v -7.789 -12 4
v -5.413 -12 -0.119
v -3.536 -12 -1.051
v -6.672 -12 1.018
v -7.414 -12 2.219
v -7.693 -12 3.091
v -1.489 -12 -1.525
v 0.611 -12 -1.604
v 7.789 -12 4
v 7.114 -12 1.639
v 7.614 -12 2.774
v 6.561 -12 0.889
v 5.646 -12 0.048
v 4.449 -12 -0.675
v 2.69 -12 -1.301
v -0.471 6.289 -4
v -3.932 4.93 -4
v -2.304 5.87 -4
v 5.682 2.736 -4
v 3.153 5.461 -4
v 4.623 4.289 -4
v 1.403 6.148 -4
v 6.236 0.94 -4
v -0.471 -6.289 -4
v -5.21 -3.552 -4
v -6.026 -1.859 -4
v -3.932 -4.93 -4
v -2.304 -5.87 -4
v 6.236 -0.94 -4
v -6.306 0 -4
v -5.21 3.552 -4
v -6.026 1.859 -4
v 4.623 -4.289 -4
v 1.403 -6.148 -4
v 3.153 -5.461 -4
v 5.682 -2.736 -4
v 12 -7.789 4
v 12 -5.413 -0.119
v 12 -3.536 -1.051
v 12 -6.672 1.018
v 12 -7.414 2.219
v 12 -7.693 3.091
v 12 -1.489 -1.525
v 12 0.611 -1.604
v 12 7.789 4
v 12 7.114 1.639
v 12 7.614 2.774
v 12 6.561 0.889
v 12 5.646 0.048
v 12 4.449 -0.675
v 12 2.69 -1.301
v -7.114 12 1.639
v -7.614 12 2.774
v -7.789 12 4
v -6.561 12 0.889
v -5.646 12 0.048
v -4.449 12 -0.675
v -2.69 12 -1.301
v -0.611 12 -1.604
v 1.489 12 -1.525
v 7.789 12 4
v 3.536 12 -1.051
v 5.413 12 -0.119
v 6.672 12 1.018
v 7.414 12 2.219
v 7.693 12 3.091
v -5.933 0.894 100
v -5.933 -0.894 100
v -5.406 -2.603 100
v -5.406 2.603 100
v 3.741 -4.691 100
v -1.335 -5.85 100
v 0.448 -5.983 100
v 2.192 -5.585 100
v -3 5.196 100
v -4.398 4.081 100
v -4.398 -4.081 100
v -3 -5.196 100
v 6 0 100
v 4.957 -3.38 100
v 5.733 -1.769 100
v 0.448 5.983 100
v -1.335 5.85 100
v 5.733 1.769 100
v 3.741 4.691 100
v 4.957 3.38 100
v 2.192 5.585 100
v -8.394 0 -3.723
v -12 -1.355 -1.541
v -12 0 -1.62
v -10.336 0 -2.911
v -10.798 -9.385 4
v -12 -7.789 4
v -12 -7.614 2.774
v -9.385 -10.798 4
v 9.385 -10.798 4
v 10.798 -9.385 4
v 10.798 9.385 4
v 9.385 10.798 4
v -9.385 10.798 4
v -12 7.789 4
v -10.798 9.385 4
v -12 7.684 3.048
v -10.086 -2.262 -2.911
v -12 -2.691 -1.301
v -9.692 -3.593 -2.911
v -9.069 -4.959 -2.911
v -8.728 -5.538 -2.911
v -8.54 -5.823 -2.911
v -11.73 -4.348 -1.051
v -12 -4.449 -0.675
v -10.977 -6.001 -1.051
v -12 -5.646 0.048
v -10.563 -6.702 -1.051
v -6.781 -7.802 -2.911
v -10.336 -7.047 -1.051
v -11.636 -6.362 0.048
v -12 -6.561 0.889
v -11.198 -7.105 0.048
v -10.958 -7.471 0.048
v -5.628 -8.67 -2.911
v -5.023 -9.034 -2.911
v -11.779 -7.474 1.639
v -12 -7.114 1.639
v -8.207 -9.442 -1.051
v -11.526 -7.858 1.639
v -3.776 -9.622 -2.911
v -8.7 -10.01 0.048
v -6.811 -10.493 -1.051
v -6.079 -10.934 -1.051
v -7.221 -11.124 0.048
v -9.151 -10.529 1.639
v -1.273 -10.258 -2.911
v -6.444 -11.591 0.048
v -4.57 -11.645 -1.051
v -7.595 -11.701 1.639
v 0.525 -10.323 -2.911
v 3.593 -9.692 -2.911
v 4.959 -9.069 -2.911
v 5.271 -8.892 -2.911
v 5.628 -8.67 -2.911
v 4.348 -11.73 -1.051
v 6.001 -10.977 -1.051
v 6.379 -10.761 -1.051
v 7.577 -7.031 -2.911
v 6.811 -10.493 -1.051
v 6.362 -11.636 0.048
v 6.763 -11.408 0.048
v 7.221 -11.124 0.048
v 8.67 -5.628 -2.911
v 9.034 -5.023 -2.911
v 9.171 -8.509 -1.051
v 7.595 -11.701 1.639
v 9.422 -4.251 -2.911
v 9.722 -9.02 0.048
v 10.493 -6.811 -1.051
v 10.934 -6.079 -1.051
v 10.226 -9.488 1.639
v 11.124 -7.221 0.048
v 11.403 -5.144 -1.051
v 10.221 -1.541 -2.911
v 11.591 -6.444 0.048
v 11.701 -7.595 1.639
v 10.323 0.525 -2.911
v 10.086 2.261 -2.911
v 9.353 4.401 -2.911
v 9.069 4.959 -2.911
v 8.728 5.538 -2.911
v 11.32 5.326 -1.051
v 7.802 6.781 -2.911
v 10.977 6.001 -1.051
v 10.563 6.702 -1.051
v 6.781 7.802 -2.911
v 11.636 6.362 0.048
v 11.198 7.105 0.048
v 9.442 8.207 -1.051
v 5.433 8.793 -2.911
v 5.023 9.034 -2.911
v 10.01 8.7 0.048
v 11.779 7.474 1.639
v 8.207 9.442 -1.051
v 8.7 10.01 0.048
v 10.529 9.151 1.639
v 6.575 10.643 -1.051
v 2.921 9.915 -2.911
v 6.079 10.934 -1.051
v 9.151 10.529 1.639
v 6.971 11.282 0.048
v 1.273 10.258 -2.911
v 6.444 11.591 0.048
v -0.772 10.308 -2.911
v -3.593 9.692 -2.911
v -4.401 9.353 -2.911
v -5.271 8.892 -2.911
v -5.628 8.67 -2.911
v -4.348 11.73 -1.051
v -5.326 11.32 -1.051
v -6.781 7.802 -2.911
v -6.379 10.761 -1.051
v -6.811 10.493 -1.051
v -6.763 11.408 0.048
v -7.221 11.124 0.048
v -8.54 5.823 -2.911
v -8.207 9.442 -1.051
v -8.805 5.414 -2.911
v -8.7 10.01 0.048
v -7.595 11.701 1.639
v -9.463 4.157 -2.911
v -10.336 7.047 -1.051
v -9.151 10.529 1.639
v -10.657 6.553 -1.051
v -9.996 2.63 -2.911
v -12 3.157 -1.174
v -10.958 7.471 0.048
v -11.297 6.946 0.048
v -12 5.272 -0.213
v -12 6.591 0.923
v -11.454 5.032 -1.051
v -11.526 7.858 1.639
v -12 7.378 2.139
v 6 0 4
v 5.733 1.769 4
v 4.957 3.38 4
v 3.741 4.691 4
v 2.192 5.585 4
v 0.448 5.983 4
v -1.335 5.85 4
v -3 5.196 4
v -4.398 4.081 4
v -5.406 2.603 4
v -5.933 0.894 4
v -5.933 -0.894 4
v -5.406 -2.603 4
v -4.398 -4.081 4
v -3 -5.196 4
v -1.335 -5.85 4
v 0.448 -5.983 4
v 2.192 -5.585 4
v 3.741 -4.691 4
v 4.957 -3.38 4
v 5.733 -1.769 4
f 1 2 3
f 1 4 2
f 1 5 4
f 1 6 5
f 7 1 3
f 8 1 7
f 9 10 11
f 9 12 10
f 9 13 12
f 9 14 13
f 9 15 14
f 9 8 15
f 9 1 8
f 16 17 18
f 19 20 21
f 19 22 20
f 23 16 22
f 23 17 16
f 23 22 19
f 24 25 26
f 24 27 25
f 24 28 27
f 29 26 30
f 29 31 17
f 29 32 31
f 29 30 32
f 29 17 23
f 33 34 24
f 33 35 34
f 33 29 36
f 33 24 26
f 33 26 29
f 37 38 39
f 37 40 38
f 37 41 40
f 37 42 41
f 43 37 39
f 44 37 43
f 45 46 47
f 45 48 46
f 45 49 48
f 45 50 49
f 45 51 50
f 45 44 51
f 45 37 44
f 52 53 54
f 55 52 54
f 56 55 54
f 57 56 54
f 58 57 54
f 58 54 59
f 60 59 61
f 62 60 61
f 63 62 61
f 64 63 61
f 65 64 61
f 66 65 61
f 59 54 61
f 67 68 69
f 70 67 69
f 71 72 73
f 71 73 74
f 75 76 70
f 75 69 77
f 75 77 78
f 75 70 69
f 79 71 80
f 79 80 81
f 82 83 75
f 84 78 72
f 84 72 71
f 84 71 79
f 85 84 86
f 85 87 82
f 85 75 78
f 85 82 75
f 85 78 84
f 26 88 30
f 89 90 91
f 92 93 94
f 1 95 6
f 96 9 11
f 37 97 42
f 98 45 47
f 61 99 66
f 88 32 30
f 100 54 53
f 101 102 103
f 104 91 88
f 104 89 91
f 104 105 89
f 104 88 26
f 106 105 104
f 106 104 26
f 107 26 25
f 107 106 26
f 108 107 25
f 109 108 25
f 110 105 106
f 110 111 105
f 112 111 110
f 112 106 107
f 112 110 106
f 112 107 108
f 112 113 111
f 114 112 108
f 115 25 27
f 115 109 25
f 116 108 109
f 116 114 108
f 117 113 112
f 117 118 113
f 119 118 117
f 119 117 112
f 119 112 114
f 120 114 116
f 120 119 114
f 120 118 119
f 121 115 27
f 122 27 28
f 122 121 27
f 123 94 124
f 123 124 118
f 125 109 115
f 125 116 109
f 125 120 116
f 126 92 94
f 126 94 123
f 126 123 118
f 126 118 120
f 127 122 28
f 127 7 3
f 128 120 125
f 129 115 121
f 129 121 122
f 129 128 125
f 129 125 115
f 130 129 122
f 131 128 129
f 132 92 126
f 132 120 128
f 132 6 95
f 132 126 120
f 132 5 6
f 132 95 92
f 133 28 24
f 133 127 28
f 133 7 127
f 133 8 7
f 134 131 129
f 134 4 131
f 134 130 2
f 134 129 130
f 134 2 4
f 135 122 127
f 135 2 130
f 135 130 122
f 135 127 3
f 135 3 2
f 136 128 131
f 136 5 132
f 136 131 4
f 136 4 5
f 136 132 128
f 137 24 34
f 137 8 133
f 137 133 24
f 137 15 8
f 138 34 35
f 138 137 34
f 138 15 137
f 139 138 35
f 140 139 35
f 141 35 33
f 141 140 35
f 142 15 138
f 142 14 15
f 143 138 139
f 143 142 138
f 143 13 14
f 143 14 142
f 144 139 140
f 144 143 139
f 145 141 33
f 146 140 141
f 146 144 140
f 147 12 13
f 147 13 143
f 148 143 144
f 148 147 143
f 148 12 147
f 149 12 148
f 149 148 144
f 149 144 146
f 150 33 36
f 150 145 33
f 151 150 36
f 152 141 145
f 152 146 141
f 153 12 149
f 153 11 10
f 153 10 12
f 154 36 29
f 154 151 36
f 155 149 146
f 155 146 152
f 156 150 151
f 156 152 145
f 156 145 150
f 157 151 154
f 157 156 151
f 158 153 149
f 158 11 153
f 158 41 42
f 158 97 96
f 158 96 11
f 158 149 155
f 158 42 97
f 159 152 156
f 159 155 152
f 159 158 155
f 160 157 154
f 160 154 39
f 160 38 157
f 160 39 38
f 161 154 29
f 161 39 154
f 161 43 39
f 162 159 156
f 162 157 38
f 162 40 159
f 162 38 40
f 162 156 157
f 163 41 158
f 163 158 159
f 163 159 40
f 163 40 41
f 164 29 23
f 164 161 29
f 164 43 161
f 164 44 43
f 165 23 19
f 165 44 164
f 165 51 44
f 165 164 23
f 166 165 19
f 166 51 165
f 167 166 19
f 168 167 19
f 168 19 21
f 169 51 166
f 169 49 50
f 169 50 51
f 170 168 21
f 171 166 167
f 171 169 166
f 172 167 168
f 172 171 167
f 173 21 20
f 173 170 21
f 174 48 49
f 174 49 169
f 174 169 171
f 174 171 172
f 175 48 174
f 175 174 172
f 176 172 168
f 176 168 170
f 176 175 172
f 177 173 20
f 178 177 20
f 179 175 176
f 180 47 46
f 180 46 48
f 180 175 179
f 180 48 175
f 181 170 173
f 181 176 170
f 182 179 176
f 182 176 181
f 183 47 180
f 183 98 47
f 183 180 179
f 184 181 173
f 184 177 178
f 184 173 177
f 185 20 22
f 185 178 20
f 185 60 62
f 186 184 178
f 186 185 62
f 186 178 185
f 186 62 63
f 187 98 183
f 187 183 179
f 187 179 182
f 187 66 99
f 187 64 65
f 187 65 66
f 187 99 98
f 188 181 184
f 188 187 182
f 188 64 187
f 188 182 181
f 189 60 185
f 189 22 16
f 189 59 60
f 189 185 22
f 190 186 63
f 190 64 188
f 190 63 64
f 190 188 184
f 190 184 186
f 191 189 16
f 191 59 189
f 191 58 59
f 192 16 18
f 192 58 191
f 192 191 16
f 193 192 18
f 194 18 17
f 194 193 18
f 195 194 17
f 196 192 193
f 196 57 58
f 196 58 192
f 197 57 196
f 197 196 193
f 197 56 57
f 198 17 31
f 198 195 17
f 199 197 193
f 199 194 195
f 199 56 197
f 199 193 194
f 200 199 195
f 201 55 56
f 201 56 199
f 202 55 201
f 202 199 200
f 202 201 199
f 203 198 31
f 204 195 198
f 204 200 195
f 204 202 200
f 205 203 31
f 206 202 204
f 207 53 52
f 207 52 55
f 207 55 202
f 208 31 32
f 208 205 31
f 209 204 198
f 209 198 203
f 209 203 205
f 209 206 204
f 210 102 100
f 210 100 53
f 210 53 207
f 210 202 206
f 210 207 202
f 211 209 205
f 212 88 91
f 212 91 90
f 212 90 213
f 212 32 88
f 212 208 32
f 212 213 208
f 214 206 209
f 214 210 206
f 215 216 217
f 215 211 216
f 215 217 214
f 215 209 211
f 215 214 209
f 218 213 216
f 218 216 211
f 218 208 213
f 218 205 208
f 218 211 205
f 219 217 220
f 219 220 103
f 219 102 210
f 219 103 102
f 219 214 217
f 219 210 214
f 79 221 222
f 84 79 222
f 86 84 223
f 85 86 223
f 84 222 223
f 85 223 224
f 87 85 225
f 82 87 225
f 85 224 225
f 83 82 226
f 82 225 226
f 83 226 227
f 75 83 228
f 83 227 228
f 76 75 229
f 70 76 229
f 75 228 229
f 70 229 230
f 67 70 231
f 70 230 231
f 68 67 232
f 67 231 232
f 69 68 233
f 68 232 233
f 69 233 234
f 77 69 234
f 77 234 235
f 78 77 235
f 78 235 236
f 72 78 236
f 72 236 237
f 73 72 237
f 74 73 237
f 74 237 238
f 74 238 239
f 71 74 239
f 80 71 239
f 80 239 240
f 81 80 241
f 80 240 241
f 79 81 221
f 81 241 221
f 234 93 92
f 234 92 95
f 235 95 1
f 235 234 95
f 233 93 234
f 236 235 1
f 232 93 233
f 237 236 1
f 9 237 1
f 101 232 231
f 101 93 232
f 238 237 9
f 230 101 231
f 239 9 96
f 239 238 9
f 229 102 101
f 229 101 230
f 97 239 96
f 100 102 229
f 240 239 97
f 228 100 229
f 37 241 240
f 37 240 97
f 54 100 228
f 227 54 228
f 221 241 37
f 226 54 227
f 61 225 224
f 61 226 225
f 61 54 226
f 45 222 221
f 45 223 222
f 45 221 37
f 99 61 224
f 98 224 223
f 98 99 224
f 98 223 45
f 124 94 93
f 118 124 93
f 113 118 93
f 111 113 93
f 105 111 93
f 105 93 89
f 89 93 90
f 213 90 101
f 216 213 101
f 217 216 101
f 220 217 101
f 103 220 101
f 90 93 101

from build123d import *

# Parameters (mm, degrees)
SKETCH1_W           = 24
SKETCH1_H           = 24
BOSS_EXTRUDE2_DEPTH = 4
SKETCH3_R           = 6
BOSS_EXTRUDE3_DEPTH = 96


with BuildPart() as part:
    # Sketch1 → Boss-Extrude2 (new, symmetric)
    with BuildSketch(Plane.XY):
        Rectangle(SKETCH1_W, SKETCH1_H)
    extrude(amount=BOSS_EXTRUDE2_DEPTH, both=True)

    # Sketch3 → Boss-Extrude3 (add)
    with BuildSketch(Plane.XY.offset(4)):
        Circle(SKETCH3_R)
    extrude(amount=BOSS_EXTRUDE3_DEPTH)

    # Sketch5 → Cut-Revolve8 (revolve, cut)
    with BuildSketch(Plane(origin=(0, 0, 0), x_dir=(1, 0, 0), z_dir=(0, 1, 0)), mode=Mode.PRIVATE) as cut_revolve8_sk:
        with BuildLine():
            Line((0, 4), (6.30628562, 4))
            ThreePointArc((6.30628562, 4), (11.96313987, 1.656854249), (14.30628562, -4))
            Line((14.30628562, -4), (24.30628562, -4))
            ThreePointArc((24.30628562, -4), (15.122793398, 9.010065299), (0, 14))
            Line((0, 14), (0, 4))
        make_face()
    revolve(cut_revolve8_sk.sketch.rotate(Axis((0, 0, -4), (0, 0, 1)), 180), axis=Axis((0, 0, -4), (0, 0, 1)), mode=Mode.SUBTRACT)


solid = part.part
